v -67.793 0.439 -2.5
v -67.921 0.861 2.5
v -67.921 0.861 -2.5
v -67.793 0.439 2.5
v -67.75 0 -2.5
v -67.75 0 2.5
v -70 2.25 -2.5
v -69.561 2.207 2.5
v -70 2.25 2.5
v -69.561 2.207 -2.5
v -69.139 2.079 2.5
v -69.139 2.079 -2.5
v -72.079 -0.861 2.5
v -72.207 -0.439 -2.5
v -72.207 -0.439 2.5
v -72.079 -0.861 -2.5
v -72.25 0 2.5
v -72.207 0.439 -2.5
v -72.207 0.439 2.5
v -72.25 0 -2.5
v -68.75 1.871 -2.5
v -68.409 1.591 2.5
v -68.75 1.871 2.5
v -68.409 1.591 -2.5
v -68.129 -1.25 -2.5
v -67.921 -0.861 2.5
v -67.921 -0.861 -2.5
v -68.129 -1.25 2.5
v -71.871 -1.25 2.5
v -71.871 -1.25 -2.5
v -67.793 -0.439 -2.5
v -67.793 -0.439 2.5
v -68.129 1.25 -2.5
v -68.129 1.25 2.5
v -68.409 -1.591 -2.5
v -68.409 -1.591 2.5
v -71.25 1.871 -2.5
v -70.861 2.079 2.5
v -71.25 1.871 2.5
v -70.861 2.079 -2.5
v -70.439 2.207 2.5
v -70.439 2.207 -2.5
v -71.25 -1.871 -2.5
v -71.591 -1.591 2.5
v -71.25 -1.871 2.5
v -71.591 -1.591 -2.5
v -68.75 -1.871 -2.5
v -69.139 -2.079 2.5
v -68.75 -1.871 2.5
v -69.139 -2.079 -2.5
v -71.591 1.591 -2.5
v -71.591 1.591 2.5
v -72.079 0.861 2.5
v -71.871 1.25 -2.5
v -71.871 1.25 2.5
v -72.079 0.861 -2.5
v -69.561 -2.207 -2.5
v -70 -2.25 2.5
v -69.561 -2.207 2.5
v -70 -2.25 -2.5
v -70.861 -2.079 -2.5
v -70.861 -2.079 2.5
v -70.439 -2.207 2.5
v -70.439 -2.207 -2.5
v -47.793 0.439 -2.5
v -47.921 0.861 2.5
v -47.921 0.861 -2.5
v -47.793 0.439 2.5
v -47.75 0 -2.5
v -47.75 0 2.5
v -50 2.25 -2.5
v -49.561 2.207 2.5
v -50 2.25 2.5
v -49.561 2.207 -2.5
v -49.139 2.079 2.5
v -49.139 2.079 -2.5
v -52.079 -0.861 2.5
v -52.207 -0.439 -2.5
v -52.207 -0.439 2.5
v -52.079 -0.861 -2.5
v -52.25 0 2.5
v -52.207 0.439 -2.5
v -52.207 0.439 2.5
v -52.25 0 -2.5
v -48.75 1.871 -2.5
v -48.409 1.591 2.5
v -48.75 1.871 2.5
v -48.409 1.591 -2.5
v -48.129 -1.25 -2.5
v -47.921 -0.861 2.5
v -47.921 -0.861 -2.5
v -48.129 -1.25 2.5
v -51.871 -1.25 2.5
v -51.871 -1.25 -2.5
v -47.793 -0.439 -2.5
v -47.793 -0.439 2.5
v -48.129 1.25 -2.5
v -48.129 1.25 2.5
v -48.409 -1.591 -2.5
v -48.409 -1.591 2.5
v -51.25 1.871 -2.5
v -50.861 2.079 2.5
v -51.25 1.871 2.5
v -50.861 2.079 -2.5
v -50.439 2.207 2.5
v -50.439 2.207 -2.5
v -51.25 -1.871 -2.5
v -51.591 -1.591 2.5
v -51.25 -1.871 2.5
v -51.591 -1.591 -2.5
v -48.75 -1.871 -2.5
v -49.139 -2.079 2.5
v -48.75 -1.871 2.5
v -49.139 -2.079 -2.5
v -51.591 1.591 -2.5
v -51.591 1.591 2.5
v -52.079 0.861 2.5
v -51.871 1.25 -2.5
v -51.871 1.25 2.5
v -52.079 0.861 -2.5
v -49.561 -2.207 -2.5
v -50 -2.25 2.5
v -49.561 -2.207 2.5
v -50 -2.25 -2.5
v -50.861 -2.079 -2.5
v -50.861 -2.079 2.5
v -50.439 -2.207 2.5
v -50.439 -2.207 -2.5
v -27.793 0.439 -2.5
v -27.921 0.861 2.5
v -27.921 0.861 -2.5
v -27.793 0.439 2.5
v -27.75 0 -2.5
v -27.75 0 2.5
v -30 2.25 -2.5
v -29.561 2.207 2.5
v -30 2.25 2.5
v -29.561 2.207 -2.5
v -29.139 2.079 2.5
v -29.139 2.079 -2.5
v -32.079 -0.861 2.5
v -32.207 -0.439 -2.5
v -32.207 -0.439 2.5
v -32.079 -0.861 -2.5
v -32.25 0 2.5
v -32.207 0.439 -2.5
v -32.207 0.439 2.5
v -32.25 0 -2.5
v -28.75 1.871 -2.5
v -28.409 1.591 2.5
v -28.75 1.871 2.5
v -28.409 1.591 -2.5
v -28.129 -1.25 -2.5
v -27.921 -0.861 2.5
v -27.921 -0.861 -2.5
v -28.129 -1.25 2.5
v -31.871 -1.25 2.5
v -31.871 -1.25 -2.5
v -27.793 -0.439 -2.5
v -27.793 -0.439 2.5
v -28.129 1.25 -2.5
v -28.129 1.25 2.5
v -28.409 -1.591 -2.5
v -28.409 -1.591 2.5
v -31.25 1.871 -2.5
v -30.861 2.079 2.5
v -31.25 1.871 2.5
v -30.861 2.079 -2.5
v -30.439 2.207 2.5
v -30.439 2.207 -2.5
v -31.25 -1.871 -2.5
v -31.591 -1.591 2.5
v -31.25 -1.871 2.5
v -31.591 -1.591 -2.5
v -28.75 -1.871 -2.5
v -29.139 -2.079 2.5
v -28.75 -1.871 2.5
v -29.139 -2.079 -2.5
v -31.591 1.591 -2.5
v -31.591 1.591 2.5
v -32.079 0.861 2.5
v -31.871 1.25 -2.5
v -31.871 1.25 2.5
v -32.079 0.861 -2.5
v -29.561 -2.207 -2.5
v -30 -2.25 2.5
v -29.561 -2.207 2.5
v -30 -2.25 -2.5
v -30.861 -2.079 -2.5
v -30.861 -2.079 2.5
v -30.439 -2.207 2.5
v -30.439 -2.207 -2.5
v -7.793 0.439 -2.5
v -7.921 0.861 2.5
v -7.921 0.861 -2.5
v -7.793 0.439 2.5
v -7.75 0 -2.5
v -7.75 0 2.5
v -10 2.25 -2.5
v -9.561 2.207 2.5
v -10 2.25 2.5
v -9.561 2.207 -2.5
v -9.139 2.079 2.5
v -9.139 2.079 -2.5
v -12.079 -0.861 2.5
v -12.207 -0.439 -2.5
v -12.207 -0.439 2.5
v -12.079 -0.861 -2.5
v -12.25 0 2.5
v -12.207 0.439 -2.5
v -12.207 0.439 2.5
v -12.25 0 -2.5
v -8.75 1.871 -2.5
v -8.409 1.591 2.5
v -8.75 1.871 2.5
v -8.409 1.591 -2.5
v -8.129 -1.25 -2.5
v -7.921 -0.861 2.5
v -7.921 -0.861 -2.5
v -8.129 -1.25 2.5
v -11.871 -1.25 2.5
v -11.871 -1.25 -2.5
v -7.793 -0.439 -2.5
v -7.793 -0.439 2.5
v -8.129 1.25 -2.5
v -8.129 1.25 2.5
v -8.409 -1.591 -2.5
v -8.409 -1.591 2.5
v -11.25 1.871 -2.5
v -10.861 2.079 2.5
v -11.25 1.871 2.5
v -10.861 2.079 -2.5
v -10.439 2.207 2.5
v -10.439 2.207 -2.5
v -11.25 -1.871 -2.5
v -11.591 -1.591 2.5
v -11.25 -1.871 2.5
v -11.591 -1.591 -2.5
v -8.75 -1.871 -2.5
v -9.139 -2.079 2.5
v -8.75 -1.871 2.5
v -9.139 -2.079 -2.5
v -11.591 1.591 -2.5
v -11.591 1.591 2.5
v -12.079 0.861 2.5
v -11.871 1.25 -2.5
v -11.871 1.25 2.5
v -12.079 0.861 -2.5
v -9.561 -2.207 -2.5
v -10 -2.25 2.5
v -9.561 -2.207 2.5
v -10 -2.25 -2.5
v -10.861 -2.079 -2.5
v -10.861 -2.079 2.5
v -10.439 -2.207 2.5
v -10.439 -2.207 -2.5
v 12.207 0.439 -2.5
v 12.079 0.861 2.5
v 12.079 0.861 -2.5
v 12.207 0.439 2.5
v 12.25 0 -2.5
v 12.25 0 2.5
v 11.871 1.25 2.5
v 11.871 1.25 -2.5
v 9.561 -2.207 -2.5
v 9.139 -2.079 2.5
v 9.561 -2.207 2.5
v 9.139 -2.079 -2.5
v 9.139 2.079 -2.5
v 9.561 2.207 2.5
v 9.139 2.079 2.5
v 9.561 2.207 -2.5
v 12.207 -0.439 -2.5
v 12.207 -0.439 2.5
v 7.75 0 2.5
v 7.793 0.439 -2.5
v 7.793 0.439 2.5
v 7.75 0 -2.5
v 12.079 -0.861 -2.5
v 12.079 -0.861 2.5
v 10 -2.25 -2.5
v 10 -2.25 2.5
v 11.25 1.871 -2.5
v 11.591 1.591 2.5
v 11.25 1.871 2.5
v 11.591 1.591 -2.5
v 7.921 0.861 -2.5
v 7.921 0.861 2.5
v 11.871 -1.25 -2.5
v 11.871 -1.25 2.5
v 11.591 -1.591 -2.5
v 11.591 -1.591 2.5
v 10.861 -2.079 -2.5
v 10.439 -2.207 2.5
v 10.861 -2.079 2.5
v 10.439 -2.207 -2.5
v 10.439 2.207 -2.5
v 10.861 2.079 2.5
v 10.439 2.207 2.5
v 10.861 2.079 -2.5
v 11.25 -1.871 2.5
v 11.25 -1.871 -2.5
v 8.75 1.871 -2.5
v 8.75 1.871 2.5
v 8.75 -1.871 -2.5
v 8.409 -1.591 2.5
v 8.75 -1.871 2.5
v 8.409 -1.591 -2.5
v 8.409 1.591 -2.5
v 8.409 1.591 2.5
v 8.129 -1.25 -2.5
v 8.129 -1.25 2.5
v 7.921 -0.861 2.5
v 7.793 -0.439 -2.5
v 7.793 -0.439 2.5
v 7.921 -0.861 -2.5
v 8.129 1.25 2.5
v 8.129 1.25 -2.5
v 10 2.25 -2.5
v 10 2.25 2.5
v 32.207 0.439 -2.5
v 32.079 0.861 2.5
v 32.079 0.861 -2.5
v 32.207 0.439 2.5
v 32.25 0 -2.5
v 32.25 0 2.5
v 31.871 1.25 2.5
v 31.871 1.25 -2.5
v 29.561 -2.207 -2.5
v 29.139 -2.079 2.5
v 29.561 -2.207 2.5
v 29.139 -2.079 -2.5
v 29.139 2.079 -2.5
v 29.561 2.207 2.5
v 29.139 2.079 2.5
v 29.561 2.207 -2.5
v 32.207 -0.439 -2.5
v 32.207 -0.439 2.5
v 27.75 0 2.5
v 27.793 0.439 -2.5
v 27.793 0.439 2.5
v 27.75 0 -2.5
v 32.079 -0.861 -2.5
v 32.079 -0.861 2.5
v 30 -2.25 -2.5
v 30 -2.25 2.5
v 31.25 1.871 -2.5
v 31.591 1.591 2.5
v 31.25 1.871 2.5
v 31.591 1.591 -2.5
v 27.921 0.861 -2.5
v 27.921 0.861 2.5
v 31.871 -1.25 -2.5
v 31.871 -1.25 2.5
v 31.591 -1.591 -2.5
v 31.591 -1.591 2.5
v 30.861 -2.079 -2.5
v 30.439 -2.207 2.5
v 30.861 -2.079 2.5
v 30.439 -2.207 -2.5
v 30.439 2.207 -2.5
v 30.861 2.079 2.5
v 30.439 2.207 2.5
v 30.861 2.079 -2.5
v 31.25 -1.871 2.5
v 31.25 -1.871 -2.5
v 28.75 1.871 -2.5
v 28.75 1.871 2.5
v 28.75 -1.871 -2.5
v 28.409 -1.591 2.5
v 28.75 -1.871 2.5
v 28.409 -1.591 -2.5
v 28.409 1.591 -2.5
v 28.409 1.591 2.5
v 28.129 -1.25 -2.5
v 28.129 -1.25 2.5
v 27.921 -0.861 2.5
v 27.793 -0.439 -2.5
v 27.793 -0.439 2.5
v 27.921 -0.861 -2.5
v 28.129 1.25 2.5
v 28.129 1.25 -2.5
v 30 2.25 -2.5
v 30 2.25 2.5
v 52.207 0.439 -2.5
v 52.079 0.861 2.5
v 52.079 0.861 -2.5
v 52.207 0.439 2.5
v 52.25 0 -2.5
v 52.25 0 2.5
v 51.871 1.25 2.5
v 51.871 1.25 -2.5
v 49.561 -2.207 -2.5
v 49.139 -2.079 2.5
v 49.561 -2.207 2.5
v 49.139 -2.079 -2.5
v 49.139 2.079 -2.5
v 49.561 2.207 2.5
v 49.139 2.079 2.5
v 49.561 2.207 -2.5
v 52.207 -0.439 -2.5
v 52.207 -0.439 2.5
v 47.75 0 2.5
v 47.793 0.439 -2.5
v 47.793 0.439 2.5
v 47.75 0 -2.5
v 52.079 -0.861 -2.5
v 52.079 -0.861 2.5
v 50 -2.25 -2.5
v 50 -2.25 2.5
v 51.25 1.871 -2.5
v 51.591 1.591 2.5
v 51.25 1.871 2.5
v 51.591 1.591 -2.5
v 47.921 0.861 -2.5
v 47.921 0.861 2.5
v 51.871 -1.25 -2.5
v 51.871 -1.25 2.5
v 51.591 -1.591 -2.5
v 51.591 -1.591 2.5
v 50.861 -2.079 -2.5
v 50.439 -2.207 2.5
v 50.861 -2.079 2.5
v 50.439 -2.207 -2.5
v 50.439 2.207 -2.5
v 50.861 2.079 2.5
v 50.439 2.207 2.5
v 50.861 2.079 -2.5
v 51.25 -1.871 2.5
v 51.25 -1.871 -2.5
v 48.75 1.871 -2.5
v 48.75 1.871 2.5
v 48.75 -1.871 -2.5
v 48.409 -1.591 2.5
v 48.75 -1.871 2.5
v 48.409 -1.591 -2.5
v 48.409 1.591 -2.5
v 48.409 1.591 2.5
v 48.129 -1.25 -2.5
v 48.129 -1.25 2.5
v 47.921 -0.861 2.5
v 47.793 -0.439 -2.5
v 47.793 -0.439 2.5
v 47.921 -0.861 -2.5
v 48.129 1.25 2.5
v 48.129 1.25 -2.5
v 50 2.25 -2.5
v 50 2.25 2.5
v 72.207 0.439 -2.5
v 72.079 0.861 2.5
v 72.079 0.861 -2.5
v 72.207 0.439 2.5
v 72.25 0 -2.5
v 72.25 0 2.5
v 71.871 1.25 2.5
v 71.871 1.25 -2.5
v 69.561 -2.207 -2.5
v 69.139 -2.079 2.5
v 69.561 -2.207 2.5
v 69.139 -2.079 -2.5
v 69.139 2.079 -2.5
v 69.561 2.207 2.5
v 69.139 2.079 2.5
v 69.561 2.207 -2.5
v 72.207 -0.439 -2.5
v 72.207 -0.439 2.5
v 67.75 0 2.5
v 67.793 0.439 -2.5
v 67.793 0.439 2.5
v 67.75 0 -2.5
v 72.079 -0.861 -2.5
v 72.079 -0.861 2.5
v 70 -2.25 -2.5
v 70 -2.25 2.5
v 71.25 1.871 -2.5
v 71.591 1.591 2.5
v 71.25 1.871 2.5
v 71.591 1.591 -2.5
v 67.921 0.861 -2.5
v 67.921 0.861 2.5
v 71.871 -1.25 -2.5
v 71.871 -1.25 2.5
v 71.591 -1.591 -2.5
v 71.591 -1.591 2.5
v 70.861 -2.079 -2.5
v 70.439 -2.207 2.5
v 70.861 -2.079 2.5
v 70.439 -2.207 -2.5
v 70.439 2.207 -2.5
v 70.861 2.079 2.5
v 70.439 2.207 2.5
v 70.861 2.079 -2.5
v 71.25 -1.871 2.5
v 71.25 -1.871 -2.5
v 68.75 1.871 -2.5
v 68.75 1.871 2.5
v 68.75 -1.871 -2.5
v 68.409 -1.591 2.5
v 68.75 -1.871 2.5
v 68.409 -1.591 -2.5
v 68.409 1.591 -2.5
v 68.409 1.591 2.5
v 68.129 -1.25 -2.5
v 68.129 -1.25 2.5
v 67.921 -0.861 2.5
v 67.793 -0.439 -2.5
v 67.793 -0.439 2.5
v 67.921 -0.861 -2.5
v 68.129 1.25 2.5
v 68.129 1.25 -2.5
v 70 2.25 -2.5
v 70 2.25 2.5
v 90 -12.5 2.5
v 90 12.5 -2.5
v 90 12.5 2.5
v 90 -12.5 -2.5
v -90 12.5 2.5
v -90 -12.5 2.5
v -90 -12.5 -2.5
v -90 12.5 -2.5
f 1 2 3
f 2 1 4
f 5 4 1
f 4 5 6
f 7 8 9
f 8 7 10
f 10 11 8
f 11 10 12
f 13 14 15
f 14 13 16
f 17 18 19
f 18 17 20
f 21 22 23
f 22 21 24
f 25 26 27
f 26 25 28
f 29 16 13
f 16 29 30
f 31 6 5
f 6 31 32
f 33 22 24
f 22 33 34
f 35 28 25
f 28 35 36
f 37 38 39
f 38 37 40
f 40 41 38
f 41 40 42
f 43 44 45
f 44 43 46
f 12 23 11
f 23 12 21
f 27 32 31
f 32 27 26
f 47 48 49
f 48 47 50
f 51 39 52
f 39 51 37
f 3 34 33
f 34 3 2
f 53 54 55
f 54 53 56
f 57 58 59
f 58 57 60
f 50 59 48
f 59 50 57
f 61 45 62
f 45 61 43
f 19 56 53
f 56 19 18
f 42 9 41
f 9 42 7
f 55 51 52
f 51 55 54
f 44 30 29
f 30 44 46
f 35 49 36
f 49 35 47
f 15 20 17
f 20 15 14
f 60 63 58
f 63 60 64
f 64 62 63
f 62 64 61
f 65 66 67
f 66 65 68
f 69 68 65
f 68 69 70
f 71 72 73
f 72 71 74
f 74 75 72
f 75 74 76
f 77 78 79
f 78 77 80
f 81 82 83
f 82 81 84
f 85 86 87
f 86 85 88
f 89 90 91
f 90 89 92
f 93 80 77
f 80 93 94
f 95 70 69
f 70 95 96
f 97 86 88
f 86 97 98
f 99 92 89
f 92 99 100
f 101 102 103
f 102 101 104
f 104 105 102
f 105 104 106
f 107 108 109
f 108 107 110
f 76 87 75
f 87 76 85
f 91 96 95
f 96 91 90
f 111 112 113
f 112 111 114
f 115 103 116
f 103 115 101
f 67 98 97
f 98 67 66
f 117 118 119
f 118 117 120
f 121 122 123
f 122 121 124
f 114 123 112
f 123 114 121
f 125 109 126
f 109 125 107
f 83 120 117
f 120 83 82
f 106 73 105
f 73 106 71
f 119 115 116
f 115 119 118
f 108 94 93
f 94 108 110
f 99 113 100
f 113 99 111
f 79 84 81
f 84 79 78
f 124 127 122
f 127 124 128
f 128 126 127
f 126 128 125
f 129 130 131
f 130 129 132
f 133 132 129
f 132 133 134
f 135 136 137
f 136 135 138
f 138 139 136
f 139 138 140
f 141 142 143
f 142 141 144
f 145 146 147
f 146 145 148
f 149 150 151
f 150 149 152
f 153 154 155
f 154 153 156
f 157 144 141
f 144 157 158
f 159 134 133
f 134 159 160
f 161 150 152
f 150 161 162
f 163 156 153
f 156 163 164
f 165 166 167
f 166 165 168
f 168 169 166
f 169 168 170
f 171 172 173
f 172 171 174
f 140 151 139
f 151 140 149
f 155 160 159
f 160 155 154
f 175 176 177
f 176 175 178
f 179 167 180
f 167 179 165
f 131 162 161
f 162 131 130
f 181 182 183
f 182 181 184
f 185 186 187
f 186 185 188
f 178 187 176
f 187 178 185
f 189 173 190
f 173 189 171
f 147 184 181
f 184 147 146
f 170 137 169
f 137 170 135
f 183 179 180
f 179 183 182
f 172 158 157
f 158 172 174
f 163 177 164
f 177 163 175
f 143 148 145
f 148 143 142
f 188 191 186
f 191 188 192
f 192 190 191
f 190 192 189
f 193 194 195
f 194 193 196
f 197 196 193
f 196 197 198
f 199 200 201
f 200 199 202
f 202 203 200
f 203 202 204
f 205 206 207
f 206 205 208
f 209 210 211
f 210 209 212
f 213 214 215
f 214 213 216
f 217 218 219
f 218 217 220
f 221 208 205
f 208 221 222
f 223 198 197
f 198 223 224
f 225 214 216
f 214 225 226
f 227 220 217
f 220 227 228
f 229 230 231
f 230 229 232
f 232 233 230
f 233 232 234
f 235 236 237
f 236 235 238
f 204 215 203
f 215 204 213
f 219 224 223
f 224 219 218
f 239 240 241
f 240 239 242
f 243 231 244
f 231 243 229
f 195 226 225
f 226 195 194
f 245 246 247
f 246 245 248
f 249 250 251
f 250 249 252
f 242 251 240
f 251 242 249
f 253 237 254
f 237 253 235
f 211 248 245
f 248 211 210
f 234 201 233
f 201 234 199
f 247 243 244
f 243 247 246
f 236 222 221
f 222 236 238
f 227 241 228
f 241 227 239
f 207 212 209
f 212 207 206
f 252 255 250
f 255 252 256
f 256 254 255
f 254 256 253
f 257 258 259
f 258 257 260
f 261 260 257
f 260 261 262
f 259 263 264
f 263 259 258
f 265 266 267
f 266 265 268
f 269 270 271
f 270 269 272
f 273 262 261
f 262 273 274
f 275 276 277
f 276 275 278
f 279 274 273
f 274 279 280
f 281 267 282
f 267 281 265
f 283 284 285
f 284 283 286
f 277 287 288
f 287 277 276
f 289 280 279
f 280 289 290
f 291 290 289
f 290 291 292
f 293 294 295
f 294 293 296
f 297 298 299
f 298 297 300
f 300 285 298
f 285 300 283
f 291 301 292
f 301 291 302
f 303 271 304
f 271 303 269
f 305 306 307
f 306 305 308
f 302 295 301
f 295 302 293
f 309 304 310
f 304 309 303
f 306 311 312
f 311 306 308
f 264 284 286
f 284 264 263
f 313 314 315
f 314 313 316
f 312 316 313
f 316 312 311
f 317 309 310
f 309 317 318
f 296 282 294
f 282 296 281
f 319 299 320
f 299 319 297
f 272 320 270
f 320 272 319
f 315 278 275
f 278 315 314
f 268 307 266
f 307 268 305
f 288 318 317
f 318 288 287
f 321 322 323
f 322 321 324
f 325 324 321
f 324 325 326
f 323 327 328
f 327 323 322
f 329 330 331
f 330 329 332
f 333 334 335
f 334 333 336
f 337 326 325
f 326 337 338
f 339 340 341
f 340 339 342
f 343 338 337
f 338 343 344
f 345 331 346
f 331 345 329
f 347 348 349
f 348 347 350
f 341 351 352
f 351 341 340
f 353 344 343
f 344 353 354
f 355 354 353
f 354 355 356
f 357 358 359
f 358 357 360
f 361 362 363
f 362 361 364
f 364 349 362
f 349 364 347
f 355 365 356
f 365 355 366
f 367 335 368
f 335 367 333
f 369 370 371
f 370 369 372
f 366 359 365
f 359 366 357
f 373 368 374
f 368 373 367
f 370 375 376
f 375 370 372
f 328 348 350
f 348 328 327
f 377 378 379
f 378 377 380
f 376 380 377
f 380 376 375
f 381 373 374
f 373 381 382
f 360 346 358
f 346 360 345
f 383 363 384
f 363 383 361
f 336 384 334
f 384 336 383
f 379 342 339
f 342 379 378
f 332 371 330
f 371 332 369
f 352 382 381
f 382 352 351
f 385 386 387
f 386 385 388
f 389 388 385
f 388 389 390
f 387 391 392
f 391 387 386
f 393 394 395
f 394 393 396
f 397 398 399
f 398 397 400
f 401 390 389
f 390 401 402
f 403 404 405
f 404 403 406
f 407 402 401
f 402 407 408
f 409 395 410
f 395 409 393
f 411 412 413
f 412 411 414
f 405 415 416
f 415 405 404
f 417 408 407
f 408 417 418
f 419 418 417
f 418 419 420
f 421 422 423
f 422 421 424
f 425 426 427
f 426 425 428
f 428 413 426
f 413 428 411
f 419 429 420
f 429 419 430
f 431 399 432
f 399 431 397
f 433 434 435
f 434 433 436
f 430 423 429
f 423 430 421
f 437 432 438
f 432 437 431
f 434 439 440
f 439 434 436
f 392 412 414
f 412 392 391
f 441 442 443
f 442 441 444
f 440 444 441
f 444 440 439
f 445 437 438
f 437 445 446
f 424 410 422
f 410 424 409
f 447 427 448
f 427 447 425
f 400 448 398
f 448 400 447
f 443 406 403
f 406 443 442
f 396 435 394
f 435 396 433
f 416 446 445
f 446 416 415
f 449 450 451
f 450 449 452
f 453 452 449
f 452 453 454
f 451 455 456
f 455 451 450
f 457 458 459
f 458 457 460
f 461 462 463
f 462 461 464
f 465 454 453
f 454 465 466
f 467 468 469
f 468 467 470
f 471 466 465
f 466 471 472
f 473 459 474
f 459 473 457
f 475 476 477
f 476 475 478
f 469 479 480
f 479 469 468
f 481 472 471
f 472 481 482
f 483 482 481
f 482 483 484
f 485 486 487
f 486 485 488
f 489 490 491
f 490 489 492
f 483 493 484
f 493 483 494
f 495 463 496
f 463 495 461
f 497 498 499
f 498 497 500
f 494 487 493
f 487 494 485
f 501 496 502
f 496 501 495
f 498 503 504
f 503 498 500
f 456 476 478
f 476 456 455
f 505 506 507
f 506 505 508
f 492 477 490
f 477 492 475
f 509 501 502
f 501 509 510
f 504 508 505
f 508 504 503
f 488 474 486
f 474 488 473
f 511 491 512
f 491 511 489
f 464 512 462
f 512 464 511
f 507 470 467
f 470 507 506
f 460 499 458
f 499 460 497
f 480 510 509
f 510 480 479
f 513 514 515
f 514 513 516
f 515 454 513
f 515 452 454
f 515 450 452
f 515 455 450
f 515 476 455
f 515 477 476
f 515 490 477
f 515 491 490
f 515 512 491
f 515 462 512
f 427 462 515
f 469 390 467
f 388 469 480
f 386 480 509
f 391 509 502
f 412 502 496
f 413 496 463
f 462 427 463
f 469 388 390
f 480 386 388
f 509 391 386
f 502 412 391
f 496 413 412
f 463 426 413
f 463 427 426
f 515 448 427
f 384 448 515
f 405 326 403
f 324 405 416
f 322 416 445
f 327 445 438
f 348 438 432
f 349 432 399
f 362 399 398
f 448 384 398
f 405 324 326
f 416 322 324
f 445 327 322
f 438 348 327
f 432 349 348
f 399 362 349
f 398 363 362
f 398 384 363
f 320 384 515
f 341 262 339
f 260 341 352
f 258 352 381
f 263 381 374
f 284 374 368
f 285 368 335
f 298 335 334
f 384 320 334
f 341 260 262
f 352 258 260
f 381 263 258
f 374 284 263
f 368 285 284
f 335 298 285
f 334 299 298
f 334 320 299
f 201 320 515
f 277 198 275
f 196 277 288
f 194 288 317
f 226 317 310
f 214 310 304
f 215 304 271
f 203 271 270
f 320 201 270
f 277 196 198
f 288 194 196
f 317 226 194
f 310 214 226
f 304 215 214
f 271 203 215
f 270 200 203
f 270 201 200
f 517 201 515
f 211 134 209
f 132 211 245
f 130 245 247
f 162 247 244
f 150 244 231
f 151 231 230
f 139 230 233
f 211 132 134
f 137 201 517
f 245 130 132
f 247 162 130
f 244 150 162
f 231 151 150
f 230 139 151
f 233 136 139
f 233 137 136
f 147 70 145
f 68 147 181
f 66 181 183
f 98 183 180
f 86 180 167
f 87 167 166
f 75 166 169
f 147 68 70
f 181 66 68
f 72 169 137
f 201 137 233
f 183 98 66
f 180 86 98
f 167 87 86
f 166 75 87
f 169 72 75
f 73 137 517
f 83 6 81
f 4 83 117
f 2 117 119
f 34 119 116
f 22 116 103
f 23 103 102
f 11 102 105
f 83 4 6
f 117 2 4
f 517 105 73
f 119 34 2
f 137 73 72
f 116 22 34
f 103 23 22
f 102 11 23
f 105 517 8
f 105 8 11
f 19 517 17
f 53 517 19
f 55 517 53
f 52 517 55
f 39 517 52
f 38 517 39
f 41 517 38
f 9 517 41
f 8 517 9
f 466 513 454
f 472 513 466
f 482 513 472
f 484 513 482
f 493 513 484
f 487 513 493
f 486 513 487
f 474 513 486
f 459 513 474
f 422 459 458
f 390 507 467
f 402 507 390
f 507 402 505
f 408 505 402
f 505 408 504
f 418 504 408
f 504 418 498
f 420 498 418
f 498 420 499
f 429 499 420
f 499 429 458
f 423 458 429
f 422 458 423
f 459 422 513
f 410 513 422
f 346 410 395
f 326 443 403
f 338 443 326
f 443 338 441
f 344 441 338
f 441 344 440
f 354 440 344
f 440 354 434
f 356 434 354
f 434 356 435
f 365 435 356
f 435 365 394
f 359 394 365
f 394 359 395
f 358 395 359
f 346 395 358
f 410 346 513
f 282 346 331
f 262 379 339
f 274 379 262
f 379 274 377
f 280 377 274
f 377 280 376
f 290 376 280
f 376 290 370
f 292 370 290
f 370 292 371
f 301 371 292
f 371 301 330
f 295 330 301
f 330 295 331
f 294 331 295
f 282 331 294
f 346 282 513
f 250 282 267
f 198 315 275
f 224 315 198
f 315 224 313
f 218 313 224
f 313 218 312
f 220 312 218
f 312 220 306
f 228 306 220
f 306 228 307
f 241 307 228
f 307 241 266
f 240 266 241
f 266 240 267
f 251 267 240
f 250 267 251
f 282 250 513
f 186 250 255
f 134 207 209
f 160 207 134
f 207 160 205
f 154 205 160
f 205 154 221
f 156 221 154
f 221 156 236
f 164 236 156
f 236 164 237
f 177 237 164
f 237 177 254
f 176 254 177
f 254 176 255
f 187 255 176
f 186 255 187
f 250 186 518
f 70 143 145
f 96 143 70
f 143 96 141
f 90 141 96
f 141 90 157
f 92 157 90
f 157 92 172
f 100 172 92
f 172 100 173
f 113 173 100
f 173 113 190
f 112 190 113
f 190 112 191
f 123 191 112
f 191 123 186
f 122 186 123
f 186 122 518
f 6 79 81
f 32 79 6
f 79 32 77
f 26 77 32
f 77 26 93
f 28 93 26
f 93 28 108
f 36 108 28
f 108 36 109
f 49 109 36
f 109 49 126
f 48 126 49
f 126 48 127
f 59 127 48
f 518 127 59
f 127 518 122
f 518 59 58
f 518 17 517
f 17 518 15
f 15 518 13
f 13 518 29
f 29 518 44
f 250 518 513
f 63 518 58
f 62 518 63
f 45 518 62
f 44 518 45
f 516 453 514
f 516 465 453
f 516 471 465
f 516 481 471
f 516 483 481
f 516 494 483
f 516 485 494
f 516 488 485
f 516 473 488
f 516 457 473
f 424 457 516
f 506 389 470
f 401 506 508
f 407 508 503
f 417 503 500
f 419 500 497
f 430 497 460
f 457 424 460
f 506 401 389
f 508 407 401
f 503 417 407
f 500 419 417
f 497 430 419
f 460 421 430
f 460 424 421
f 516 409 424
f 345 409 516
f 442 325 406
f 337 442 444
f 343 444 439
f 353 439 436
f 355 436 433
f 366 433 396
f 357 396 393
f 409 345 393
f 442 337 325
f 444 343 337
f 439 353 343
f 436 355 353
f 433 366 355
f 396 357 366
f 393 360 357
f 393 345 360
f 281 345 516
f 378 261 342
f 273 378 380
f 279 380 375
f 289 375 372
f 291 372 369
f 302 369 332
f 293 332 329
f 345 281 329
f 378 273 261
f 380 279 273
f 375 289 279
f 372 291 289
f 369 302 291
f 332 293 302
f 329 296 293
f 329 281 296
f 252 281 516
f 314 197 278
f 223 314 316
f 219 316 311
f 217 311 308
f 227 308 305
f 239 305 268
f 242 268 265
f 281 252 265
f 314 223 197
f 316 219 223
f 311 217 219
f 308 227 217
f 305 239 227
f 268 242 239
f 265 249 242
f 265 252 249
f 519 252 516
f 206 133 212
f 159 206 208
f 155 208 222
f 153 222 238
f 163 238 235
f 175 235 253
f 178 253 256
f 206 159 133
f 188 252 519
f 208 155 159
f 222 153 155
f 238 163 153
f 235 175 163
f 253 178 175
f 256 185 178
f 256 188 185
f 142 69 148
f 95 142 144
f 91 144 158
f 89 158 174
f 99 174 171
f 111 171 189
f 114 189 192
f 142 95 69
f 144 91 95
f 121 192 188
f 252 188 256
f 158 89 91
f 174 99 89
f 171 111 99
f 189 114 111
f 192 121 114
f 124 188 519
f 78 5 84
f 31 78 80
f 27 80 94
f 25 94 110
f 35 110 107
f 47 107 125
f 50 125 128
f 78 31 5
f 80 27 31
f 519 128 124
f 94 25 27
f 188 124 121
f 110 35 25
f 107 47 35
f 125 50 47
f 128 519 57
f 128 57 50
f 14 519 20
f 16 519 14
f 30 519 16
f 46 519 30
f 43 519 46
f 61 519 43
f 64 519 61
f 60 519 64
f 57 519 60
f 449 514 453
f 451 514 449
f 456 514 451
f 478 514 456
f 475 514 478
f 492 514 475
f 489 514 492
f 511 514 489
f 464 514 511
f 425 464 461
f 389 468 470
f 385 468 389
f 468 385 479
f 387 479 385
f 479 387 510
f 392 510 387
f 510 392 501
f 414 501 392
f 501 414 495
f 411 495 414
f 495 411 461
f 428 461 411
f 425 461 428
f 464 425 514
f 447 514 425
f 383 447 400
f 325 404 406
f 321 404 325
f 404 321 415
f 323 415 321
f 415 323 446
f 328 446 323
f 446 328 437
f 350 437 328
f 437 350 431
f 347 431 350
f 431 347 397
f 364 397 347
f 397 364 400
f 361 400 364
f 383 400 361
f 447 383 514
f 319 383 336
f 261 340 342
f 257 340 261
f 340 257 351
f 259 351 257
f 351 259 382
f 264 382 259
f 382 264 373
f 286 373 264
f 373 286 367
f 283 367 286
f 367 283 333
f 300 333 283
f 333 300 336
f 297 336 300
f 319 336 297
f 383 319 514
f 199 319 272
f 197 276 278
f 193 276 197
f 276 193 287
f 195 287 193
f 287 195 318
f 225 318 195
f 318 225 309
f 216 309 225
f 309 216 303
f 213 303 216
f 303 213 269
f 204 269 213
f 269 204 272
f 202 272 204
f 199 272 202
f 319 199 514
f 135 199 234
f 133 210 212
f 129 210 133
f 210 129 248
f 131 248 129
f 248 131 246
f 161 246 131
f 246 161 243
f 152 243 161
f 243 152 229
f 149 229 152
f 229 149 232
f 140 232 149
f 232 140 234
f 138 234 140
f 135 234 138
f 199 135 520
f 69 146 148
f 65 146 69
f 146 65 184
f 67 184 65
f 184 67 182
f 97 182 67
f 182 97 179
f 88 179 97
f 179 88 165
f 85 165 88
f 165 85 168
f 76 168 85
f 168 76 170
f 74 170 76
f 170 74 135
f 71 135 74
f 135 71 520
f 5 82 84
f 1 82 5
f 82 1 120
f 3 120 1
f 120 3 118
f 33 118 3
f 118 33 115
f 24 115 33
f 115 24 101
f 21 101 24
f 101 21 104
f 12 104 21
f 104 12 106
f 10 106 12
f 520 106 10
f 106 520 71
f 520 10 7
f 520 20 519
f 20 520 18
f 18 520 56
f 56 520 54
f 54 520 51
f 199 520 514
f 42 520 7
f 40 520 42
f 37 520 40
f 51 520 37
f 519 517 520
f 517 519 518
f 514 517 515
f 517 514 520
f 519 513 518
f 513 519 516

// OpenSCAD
$fn = 32;

// ----------------------------------------------------------------------
// Hole bar, 8 x Ø4.5
// skip layout, 20 mm edge offset
// ----------------------------------------------------------------------

// --- parameters (mm) ---
bar_w = 25;       // bar width (Y)
bar_t = 5;        // bar thickness (Z)
holes = 8;        // holes per row
hole_d = 4.5;     // hole diameter
edge = 20;        // offset from the bar end to the first hole
grid_pitch = 10;  // grid the bar was laid out on

// --- derived feature positions (mm) ---
pitch = grid_pitch * 2;       // = 20   holes sit every other grid slot
span = (holes - 1) * pitch;   // = 140   distance between the end holes
bar_l = span + 2 * edge;      // = 180   overall bar length
start_x = -bar_l / 2 + edge;  // = -70   X of the first hole
feature_centers = [
  [start_x + 0 * pitch, 0],
  [start_x + 1 * pitch, 0],
  [start_x + 2 * pitch, 0],
  [start_x + 3 * pitch, 0],
  [start_x + 4 * pitch, 0],
  [start_x + 5 * pitch, 0],
  [start_x + 6 * pitch, 0],
  [start_x + 7 * pitch, 0]
];   // hole centres of the first row

// bar with one row of holes, drilled from feature_centers
difference() {
  translate([-bar_l / 2, -bar_w / 2, -bar_t / 2]) cube([bar_l, bar_w, bar_t]);
  for (centre = feature_centers)
    translate([centre[0], centre[1], 0])
      cylinder(d = hole_d, h = bar_t + 2, center = true);
}
